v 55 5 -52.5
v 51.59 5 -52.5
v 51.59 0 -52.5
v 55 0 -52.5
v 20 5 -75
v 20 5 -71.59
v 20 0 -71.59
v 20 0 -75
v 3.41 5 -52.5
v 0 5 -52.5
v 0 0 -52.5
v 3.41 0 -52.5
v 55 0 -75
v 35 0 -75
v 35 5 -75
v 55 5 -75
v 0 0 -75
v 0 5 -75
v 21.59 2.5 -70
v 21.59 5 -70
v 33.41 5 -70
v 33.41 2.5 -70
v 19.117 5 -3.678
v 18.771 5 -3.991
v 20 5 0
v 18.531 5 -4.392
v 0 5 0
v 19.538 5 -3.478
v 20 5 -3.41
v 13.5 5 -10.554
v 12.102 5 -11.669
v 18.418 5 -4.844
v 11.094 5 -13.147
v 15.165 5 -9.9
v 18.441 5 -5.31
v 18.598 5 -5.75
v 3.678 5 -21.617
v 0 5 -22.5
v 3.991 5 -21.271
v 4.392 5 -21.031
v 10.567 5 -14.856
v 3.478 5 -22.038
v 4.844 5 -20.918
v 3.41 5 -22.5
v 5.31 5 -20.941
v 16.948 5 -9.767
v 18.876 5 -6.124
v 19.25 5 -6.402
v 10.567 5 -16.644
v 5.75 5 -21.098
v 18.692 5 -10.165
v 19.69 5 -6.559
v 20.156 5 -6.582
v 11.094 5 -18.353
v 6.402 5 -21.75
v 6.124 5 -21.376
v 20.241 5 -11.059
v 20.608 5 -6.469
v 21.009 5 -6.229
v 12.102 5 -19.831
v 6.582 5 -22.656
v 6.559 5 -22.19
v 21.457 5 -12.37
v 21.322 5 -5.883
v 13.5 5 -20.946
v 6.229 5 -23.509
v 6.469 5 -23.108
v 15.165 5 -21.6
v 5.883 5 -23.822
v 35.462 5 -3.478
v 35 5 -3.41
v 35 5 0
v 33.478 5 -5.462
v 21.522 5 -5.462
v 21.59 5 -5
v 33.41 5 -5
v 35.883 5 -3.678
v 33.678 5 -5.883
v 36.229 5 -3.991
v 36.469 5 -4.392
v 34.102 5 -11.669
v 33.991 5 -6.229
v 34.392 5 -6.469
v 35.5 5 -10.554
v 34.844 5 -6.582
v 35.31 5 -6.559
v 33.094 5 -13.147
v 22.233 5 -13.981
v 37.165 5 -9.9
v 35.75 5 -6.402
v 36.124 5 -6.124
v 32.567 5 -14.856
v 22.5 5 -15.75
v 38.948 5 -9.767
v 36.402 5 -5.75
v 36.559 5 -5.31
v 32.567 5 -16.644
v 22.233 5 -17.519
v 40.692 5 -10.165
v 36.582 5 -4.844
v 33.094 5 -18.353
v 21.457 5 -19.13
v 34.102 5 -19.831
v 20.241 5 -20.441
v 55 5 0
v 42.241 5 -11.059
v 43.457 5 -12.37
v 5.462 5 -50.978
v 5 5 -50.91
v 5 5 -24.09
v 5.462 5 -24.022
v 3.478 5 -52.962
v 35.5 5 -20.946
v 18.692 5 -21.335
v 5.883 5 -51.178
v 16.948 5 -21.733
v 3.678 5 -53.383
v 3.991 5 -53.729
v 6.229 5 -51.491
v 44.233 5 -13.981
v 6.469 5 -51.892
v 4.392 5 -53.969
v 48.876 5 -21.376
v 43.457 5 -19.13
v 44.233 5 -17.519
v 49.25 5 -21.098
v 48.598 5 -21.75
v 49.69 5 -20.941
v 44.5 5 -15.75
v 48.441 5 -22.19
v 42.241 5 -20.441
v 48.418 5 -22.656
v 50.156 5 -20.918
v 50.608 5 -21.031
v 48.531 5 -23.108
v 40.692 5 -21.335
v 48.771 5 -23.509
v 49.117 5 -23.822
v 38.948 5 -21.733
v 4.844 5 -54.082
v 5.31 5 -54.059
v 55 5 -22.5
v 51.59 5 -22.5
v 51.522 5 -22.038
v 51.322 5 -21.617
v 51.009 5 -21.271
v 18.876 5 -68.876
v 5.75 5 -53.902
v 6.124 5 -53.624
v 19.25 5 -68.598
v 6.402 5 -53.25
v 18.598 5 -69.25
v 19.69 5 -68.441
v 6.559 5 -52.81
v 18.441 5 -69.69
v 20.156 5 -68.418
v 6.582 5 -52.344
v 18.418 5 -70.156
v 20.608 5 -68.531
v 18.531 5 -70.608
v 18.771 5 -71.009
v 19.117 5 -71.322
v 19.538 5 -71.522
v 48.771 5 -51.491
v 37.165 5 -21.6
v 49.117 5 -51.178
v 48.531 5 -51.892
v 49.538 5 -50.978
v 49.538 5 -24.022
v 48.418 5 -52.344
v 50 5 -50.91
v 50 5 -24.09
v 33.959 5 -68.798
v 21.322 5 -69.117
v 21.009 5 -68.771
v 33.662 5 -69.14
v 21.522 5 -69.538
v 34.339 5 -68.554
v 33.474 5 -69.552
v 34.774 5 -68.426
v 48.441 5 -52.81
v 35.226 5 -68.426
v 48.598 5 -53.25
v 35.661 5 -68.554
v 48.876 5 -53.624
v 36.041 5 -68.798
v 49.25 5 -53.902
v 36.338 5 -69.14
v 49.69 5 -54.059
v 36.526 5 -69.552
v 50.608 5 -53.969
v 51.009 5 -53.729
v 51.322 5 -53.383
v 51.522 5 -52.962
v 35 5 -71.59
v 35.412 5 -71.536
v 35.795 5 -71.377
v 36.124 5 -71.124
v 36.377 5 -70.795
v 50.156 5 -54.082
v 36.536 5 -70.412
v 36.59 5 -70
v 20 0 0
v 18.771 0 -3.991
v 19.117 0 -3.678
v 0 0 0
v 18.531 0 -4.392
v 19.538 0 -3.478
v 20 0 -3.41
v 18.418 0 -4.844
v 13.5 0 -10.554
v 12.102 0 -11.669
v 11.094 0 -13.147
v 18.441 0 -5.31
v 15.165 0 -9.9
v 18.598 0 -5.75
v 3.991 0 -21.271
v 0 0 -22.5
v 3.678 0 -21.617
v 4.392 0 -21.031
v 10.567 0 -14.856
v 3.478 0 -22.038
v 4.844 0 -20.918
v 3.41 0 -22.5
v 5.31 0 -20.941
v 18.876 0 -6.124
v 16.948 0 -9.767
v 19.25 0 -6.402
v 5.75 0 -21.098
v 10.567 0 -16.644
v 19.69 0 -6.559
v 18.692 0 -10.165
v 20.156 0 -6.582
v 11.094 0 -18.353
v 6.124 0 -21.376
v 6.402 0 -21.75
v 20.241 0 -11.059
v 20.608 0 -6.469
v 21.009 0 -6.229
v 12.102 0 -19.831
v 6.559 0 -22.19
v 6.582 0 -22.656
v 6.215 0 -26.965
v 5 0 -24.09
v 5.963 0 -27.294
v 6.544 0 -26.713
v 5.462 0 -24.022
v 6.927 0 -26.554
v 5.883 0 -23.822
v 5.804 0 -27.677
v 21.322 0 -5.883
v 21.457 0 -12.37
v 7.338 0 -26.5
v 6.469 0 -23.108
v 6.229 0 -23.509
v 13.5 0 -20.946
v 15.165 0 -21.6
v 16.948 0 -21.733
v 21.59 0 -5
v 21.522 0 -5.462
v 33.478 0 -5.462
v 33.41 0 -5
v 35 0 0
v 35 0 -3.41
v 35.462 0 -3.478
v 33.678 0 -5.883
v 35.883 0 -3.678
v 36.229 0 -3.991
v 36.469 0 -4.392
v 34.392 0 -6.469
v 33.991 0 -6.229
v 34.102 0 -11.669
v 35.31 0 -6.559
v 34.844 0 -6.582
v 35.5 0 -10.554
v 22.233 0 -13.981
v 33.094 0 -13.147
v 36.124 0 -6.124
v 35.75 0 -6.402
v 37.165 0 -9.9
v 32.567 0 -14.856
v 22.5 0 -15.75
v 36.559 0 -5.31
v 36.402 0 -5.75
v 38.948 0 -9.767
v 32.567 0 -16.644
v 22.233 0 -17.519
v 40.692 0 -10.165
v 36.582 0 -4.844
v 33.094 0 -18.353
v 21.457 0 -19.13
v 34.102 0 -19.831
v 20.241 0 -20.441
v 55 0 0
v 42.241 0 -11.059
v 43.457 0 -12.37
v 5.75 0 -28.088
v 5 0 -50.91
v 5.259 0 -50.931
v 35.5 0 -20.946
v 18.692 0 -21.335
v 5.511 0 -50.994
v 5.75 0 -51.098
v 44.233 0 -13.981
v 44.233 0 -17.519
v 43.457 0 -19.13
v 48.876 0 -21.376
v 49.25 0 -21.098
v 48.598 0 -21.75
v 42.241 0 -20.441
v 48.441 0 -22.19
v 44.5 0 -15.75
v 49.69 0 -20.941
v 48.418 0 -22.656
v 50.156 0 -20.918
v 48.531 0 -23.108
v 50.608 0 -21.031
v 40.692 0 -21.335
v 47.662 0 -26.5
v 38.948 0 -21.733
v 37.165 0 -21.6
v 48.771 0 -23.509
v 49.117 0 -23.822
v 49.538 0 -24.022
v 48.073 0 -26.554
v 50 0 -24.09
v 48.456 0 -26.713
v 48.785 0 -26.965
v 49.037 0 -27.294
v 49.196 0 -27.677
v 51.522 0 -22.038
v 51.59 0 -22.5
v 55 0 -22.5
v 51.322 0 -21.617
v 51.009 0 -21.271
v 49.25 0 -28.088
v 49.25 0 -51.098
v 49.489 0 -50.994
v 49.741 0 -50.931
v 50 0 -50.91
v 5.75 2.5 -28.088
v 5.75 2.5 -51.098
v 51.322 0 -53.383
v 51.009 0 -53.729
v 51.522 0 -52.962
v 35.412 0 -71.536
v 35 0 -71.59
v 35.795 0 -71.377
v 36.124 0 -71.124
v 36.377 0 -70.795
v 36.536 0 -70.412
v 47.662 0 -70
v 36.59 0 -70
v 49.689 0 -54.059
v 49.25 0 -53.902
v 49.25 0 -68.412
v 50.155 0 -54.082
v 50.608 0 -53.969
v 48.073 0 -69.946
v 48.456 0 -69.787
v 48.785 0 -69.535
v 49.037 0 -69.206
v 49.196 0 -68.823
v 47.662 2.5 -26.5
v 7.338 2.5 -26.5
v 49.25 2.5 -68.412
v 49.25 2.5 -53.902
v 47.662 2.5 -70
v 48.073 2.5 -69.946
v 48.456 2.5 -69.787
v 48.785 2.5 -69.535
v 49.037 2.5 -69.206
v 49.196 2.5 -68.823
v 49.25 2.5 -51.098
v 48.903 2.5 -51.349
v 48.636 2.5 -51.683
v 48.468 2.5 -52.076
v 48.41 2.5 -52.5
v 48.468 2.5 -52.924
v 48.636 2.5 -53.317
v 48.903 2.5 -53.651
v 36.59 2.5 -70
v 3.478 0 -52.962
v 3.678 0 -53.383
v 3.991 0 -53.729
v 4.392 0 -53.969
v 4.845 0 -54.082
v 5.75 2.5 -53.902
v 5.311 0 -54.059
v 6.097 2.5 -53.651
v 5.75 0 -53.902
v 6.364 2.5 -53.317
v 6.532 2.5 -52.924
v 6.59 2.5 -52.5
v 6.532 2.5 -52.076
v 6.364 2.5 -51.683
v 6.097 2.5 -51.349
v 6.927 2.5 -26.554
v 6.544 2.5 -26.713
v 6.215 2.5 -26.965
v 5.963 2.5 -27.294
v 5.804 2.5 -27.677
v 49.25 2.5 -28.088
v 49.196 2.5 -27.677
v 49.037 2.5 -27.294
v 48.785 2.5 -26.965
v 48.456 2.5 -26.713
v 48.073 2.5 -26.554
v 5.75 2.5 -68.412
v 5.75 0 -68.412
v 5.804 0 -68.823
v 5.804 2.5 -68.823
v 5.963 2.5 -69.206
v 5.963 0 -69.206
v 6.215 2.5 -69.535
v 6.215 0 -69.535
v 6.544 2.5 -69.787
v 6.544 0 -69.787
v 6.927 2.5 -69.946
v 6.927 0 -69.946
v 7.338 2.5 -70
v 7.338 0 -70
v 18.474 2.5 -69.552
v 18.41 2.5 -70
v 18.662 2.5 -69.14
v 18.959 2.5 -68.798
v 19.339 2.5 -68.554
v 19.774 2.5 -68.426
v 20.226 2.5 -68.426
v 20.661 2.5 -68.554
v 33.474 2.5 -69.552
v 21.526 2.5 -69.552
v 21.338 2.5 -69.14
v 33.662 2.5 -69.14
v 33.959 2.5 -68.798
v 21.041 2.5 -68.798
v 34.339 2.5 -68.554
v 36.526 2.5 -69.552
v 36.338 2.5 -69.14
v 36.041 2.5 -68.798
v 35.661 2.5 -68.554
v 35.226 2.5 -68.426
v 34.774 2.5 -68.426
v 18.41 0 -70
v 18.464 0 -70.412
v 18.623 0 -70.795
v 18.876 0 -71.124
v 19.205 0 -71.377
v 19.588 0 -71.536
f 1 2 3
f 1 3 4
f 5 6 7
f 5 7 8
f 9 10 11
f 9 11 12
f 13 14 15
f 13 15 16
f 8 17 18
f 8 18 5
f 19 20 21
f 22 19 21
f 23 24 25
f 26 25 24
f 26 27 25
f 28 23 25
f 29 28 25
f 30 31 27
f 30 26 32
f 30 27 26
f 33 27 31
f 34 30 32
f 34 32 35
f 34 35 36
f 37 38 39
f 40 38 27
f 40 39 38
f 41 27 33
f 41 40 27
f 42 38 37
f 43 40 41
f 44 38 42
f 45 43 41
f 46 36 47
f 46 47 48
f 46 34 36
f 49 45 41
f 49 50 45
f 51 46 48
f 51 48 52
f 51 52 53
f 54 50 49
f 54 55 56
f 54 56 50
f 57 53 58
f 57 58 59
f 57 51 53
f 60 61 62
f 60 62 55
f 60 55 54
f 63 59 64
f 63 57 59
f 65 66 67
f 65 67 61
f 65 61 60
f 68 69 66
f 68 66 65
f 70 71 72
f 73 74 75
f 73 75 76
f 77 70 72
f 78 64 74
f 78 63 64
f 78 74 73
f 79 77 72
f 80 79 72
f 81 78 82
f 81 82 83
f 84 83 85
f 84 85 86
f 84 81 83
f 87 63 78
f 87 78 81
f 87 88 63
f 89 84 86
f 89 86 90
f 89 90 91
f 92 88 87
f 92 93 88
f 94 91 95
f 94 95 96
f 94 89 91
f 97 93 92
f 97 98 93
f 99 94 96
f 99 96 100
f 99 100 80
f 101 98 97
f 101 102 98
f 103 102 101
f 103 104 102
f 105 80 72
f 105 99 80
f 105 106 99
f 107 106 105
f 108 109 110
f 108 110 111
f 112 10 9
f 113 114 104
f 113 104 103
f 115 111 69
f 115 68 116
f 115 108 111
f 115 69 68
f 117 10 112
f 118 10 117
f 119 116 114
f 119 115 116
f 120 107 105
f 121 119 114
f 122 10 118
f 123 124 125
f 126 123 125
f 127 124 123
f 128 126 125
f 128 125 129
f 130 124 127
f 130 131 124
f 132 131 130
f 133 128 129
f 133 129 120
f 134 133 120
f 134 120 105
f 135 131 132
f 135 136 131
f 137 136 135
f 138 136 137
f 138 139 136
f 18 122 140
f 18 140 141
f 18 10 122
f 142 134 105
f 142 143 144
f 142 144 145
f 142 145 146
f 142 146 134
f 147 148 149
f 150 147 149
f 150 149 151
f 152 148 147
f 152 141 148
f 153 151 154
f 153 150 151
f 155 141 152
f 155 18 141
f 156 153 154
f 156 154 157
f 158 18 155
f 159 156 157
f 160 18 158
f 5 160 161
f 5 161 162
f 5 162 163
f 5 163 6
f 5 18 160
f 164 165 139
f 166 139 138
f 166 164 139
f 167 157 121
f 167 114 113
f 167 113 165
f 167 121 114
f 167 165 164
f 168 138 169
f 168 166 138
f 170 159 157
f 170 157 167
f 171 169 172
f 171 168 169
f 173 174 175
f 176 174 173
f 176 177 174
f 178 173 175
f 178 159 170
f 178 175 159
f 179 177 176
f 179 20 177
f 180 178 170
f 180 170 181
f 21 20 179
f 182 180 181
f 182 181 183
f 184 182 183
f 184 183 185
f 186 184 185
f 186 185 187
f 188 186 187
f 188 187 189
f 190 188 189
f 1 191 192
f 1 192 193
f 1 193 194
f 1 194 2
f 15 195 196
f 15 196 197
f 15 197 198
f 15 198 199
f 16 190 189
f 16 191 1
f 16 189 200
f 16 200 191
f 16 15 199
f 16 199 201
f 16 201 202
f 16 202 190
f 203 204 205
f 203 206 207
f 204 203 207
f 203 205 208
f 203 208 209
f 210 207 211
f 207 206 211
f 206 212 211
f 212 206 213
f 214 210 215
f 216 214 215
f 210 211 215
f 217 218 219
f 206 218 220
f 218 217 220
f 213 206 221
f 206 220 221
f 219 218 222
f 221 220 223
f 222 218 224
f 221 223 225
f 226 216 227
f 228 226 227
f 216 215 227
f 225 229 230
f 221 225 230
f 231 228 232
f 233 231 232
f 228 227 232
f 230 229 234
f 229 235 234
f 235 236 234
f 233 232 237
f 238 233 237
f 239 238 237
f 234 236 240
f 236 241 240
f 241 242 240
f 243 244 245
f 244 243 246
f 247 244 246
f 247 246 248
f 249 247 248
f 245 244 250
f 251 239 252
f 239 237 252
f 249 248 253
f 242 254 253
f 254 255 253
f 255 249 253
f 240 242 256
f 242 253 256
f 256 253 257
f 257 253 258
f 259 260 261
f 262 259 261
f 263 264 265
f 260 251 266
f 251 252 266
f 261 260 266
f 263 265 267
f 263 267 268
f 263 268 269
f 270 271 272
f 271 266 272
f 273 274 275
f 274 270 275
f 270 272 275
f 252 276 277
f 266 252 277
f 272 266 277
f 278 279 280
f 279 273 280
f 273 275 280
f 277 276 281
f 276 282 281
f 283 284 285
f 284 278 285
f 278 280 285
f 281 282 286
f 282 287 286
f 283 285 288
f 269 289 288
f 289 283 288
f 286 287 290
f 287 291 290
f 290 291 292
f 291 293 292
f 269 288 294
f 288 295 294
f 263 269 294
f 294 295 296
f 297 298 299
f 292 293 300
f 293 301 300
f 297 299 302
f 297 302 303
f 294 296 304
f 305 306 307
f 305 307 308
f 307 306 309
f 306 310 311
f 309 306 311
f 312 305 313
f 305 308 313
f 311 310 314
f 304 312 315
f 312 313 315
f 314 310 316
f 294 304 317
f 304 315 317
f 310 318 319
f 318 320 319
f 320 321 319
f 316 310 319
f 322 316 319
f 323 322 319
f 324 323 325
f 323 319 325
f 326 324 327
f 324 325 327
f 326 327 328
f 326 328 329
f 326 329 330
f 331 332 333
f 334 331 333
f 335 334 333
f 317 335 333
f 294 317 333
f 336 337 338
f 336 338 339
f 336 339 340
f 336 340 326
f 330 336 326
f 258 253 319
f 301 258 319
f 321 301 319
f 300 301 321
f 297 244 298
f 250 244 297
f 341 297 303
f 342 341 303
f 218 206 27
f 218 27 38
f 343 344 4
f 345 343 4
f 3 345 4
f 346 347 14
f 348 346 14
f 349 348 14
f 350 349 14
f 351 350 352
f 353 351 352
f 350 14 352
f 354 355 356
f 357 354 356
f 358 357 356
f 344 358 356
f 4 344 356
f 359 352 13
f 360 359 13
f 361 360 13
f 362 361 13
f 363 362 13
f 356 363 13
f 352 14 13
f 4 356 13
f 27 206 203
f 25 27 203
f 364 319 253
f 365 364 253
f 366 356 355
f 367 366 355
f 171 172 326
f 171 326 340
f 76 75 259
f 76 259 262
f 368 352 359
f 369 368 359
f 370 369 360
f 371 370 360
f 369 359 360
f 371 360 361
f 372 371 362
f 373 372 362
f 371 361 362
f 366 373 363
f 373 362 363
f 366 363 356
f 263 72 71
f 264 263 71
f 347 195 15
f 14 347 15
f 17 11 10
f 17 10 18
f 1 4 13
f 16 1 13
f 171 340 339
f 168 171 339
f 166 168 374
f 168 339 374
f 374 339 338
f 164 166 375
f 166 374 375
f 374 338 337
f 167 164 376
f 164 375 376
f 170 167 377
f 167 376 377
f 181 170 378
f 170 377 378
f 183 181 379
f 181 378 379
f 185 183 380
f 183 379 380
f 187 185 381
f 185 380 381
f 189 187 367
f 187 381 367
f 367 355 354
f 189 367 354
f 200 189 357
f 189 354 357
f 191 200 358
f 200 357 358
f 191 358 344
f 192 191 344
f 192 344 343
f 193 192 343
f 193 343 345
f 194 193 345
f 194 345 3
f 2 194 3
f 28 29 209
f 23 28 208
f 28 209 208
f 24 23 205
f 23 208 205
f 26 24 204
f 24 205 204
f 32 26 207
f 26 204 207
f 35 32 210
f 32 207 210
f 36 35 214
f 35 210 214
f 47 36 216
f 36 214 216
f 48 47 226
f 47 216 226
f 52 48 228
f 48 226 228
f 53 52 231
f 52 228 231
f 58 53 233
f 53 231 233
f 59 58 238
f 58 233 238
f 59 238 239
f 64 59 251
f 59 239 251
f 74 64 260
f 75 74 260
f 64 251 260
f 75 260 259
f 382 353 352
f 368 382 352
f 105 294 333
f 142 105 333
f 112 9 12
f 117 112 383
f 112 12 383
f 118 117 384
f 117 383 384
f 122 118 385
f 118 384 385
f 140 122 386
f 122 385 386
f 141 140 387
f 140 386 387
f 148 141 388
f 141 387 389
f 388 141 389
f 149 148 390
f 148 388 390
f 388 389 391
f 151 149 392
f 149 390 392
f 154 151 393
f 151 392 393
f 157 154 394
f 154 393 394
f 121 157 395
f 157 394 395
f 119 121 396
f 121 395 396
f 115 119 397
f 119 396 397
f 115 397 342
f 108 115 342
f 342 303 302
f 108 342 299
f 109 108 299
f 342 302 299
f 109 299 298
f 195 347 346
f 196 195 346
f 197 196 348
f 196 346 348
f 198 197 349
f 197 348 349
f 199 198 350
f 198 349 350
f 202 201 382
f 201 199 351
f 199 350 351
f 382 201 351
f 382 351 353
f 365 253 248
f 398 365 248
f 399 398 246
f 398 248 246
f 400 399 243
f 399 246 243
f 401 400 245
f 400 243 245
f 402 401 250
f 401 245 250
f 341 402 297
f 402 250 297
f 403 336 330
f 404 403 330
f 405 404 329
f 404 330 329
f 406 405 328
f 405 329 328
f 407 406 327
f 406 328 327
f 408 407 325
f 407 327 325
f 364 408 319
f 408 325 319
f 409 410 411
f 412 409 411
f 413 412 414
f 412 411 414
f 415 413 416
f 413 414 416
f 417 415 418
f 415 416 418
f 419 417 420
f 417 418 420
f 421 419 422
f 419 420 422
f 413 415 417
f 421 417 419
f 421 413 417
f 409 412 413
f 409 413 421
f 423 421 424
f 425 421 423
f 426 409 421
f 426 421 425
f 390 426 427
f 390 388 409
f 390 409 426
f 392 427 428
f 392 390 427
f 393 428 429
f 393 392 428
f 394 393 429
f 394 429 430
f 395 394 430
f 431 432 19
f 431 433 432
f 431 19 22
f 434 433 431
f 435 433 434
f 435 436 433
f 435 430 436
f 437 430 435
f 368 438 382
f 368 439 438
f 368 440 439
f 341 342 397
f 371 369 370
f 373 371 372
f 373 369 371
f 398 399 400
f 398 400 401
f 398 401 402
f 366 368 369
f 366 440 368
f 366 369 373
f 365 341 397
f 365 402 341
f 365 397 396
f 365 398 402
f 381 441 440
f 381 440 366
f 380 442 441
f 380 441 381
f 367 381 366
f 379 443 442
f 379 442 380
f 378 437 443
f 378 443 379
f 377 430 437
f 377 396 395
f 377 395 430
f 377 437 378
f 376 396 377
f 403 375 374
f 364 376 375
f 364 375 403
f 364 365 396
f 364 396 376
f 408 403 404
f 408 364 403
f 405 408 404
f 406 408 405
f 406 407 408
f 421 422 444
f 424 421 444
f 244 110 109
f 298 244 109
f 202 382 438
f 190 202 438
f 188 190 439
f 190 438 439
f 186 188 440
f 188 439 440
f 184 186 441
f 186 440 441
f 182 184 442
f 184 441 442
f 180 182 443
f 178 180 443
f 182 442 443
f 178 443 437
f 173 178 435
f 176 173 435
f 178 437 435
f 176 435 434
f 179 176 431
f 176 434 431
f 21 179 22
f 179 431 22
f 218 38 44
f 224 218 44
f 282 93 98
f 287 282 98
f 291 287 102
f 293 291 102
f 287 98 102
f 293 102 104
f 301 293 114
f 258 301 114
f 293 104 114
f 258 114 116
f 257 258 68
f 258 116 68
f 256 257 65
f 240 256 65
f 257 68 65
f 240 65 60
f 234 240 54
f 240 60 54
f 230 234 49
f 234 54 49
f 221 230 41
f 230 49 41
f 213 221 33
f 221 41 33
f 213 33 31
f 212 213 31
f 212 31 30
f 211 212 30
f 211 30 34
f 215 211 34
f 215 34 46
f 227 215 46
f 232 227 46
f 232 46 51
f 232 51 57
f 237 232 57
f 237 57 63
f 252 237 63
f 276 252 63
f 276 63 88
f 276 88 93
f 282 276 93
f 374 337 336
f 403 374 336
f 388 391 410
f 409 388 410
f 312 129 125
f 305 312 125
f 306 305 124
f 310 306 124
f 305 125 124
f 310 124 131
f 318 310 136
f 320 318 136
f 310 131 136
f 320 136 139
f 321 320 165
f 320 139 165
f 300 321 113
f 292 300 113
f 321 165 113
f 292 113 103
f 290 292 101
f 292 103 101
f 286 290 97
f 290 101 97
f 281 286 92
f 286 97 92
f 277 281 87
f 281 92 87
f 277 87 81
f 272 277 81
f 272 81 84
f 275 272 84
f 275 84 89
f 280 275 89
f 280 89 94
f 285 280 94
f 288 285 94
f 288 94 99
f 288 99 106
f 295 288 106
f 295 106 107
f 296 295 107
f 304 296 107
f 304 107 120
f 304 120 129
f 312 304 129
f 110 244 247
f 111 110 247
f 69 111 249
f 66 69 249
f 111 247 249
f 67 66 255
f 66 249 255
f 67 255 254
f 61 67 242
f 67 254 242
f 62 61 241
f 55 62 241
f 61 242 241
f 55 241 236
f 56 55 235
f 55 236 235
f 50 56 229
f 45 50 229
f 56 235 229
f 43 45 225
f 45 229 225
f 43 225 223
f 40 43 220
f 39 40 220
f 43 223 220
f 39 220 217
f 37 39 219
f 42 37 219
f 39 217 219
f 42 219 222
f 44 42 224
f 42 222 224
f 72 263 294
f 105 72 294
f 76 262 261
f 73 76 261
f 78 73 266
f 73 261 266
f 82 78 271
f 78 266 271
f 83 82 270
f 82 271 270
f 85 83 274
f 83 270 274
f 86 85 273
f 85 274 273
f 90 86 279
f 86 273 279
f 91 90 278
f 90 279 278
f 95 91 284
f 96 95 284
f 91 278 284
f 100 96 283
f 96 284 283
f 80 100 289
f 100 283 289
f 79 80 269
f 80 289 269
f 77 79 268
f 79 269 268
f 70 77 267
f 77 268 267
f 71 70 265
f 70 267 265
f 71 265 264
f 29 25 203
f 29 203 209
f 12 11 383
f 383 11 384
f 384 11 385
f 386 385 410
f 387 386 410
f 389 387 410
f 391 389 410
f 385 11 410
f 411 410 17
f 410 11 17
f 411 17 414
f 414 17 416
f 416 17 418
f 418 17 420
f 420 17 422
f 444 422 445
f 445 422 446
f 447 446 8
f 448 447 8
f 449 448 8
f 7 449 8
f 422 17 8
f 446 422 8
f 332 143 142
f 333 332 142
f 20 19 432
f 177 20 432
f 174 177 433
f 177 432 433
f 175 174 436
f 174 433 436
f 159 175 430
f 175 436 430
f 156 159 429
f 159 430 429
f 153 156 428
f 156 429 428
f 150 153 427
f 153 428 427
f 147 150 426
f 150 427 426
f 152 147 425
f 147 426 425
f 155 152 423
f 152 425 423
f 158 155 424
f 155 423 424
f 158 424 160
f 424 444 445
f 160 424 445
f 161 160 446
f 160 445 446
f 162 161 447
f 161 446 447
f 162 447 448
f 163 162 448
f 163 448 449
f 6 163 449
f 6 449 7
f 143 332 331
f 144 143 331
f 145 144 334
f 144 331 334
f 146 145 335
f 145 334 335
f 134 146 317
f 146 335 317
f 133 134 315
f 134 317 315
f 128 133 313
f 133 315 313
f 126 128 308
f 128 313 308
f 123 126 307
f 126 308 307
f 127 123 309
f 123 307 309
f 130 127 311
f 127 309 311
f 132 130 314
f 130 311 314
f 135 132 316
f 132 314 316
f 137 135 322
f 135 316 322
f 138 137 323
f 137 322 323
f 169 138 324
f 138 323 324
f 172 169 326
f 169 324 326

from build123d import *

# Parameters (mm, degrees)
SKETCH1_W               = 55
SKETCH1_H               = 75
BOSS_EXTRUDE1_DEPTH     = 5
SKETCH5_W               = 5
SKETCH5_H               = 30
SKETCH5_W_2             = 15
SKETCH5_H_2             = 5
CUT_EXTRUDE3_DEPTH      = 1
CUT_EXTRUDE3_DEPTH_BACK = 6
CUT_EXTRUDE4_DEPTH      = 2.5
SKETCH7_R               = 6
CUT_EXTRUDE5_DEPTH      = 6
SKETCH8_R               = 1.59
CUT_EXTRUDE6_DEPTH      = 6


with BuildPart() as part:
    # Sketch1 → Boss-Extrude1 (new body)
    with BuildSketch(Plane(origin=(0, 0, 0), x_dir=(1, 0, 0), z_dir=(0, 1, 0))):
        with Locations((27.5, 37.5)):
            Rectangle(SKETCH1_W, SKETCH1_H)
    extrude(amount=BOSS_EXTRUDE1_DEPTH)

    # Sketch5 → Cut-Extrude3 (cut, two sides)
    with BuildSketch(Plane(origin=(0, 5, 0), x_dir=(1, 0, 0), z_dir=(0, 1, 0))) as cut_extrude3_sk:
        with Locations((2.5, 37.5)):
            Rectangle(SKETCH5_W, SKETCH5_H)
        with Locations((27.5, 72.5)):
            Rectangle(SKETCH5_W_2, SKETCH5_H_2)
        with Locations((52.5, 37.5)):
            Rectangle(SKETCH5_W, SKETCH5_H)
        with Locations((27.5, 2.5)):
            Rectangle(SKETCH5_W_2, SKETCH5_H_2)
    extrude(amount=CUT_EXTRUDE3_DEPTH, mode=Mode.SUBTRACT)
    extrude(cut_extrude3_sk.sketch, amount=-CUT_EXTRUDE3_DEPTH_BACK, mode=Mode.SUBTRACT)

    # Sketch6 → Cut-Extrude4 (cut)
    with BuildSketch(Plane.XZ):
        with BuildLine():
            Line((7.3375, -70), (47.6625, -70))
            ThreePointArc((47.6625, -70), (48.785032015, -69.535032015), (49.25, -68.4125))
            Line((49.25, -68.4125), (49.25, -28.0875))
            ThreePointArc((49.25, -28.0875), (48.785032015, -26.964967985), (47.6625, -26.5))
            Line((47.6625, -26.5), (7.3375, -26.5))
            ThreePointArc((7.3375, -26.5), (6.214967985, -26.964967985), (5.75, -28.0875))
            Line((5.75, -28.0875), (5.75, -68.4125))
            ThreePointArc((5.75, -68.4125), (6.214967985, -69.535032015), (7.3375, -70))
        make_face()
    extrude(amount=-CUT_EXTRUDE4_DEPTH, mode=Mode.SUBTRACT)

    # Sketch7 → Cut-Extrude5 (cut, through all)
    with BuildSketch(Plane(origin=(0, 5, 0), x_dir=(1, 0, 0), z_dir=(0, 1, 0))):
        with Locations((16.5, 15.75)):
            Circle(SKETCH7_R)
        with Locations((38.5, 15.75)):
            Circle(SKETCH7_R)
    extrude(amount=-CUT_EXTRUDE5_DEPTH, mode=Mode.SUBTRACT)

    # Sketch8 → Cut-Extrude6 (cut, through all)
    with BuildSketch(Plane.XZ):
        with Locations((5, -22.5)):
            Circle(SKETCH8_R)
        with Locations((20, -5)):
            Circle(SKETCH8_R)
        with Locations((35, -5)):
            Circle(SKETCH8_R)
        with Locations((50, -22.5)):
            Circle(SKETCH8_R)
        with Locations((50, -52.5)):
            Circle(SKETCH8_R)
        with Locations((35, -70)):
            Circle(SKETCH8_R)
        with Locations((20, -70)):
            Circle(SKETCH8_R)
        with Locations((5, -52.5)):
            Circle(SKETCH8_R)
    extrude(amount=-CUT_EXTRUDE6_DEPTH, mode=Mode.SUBTRACT)


solid = part.part
